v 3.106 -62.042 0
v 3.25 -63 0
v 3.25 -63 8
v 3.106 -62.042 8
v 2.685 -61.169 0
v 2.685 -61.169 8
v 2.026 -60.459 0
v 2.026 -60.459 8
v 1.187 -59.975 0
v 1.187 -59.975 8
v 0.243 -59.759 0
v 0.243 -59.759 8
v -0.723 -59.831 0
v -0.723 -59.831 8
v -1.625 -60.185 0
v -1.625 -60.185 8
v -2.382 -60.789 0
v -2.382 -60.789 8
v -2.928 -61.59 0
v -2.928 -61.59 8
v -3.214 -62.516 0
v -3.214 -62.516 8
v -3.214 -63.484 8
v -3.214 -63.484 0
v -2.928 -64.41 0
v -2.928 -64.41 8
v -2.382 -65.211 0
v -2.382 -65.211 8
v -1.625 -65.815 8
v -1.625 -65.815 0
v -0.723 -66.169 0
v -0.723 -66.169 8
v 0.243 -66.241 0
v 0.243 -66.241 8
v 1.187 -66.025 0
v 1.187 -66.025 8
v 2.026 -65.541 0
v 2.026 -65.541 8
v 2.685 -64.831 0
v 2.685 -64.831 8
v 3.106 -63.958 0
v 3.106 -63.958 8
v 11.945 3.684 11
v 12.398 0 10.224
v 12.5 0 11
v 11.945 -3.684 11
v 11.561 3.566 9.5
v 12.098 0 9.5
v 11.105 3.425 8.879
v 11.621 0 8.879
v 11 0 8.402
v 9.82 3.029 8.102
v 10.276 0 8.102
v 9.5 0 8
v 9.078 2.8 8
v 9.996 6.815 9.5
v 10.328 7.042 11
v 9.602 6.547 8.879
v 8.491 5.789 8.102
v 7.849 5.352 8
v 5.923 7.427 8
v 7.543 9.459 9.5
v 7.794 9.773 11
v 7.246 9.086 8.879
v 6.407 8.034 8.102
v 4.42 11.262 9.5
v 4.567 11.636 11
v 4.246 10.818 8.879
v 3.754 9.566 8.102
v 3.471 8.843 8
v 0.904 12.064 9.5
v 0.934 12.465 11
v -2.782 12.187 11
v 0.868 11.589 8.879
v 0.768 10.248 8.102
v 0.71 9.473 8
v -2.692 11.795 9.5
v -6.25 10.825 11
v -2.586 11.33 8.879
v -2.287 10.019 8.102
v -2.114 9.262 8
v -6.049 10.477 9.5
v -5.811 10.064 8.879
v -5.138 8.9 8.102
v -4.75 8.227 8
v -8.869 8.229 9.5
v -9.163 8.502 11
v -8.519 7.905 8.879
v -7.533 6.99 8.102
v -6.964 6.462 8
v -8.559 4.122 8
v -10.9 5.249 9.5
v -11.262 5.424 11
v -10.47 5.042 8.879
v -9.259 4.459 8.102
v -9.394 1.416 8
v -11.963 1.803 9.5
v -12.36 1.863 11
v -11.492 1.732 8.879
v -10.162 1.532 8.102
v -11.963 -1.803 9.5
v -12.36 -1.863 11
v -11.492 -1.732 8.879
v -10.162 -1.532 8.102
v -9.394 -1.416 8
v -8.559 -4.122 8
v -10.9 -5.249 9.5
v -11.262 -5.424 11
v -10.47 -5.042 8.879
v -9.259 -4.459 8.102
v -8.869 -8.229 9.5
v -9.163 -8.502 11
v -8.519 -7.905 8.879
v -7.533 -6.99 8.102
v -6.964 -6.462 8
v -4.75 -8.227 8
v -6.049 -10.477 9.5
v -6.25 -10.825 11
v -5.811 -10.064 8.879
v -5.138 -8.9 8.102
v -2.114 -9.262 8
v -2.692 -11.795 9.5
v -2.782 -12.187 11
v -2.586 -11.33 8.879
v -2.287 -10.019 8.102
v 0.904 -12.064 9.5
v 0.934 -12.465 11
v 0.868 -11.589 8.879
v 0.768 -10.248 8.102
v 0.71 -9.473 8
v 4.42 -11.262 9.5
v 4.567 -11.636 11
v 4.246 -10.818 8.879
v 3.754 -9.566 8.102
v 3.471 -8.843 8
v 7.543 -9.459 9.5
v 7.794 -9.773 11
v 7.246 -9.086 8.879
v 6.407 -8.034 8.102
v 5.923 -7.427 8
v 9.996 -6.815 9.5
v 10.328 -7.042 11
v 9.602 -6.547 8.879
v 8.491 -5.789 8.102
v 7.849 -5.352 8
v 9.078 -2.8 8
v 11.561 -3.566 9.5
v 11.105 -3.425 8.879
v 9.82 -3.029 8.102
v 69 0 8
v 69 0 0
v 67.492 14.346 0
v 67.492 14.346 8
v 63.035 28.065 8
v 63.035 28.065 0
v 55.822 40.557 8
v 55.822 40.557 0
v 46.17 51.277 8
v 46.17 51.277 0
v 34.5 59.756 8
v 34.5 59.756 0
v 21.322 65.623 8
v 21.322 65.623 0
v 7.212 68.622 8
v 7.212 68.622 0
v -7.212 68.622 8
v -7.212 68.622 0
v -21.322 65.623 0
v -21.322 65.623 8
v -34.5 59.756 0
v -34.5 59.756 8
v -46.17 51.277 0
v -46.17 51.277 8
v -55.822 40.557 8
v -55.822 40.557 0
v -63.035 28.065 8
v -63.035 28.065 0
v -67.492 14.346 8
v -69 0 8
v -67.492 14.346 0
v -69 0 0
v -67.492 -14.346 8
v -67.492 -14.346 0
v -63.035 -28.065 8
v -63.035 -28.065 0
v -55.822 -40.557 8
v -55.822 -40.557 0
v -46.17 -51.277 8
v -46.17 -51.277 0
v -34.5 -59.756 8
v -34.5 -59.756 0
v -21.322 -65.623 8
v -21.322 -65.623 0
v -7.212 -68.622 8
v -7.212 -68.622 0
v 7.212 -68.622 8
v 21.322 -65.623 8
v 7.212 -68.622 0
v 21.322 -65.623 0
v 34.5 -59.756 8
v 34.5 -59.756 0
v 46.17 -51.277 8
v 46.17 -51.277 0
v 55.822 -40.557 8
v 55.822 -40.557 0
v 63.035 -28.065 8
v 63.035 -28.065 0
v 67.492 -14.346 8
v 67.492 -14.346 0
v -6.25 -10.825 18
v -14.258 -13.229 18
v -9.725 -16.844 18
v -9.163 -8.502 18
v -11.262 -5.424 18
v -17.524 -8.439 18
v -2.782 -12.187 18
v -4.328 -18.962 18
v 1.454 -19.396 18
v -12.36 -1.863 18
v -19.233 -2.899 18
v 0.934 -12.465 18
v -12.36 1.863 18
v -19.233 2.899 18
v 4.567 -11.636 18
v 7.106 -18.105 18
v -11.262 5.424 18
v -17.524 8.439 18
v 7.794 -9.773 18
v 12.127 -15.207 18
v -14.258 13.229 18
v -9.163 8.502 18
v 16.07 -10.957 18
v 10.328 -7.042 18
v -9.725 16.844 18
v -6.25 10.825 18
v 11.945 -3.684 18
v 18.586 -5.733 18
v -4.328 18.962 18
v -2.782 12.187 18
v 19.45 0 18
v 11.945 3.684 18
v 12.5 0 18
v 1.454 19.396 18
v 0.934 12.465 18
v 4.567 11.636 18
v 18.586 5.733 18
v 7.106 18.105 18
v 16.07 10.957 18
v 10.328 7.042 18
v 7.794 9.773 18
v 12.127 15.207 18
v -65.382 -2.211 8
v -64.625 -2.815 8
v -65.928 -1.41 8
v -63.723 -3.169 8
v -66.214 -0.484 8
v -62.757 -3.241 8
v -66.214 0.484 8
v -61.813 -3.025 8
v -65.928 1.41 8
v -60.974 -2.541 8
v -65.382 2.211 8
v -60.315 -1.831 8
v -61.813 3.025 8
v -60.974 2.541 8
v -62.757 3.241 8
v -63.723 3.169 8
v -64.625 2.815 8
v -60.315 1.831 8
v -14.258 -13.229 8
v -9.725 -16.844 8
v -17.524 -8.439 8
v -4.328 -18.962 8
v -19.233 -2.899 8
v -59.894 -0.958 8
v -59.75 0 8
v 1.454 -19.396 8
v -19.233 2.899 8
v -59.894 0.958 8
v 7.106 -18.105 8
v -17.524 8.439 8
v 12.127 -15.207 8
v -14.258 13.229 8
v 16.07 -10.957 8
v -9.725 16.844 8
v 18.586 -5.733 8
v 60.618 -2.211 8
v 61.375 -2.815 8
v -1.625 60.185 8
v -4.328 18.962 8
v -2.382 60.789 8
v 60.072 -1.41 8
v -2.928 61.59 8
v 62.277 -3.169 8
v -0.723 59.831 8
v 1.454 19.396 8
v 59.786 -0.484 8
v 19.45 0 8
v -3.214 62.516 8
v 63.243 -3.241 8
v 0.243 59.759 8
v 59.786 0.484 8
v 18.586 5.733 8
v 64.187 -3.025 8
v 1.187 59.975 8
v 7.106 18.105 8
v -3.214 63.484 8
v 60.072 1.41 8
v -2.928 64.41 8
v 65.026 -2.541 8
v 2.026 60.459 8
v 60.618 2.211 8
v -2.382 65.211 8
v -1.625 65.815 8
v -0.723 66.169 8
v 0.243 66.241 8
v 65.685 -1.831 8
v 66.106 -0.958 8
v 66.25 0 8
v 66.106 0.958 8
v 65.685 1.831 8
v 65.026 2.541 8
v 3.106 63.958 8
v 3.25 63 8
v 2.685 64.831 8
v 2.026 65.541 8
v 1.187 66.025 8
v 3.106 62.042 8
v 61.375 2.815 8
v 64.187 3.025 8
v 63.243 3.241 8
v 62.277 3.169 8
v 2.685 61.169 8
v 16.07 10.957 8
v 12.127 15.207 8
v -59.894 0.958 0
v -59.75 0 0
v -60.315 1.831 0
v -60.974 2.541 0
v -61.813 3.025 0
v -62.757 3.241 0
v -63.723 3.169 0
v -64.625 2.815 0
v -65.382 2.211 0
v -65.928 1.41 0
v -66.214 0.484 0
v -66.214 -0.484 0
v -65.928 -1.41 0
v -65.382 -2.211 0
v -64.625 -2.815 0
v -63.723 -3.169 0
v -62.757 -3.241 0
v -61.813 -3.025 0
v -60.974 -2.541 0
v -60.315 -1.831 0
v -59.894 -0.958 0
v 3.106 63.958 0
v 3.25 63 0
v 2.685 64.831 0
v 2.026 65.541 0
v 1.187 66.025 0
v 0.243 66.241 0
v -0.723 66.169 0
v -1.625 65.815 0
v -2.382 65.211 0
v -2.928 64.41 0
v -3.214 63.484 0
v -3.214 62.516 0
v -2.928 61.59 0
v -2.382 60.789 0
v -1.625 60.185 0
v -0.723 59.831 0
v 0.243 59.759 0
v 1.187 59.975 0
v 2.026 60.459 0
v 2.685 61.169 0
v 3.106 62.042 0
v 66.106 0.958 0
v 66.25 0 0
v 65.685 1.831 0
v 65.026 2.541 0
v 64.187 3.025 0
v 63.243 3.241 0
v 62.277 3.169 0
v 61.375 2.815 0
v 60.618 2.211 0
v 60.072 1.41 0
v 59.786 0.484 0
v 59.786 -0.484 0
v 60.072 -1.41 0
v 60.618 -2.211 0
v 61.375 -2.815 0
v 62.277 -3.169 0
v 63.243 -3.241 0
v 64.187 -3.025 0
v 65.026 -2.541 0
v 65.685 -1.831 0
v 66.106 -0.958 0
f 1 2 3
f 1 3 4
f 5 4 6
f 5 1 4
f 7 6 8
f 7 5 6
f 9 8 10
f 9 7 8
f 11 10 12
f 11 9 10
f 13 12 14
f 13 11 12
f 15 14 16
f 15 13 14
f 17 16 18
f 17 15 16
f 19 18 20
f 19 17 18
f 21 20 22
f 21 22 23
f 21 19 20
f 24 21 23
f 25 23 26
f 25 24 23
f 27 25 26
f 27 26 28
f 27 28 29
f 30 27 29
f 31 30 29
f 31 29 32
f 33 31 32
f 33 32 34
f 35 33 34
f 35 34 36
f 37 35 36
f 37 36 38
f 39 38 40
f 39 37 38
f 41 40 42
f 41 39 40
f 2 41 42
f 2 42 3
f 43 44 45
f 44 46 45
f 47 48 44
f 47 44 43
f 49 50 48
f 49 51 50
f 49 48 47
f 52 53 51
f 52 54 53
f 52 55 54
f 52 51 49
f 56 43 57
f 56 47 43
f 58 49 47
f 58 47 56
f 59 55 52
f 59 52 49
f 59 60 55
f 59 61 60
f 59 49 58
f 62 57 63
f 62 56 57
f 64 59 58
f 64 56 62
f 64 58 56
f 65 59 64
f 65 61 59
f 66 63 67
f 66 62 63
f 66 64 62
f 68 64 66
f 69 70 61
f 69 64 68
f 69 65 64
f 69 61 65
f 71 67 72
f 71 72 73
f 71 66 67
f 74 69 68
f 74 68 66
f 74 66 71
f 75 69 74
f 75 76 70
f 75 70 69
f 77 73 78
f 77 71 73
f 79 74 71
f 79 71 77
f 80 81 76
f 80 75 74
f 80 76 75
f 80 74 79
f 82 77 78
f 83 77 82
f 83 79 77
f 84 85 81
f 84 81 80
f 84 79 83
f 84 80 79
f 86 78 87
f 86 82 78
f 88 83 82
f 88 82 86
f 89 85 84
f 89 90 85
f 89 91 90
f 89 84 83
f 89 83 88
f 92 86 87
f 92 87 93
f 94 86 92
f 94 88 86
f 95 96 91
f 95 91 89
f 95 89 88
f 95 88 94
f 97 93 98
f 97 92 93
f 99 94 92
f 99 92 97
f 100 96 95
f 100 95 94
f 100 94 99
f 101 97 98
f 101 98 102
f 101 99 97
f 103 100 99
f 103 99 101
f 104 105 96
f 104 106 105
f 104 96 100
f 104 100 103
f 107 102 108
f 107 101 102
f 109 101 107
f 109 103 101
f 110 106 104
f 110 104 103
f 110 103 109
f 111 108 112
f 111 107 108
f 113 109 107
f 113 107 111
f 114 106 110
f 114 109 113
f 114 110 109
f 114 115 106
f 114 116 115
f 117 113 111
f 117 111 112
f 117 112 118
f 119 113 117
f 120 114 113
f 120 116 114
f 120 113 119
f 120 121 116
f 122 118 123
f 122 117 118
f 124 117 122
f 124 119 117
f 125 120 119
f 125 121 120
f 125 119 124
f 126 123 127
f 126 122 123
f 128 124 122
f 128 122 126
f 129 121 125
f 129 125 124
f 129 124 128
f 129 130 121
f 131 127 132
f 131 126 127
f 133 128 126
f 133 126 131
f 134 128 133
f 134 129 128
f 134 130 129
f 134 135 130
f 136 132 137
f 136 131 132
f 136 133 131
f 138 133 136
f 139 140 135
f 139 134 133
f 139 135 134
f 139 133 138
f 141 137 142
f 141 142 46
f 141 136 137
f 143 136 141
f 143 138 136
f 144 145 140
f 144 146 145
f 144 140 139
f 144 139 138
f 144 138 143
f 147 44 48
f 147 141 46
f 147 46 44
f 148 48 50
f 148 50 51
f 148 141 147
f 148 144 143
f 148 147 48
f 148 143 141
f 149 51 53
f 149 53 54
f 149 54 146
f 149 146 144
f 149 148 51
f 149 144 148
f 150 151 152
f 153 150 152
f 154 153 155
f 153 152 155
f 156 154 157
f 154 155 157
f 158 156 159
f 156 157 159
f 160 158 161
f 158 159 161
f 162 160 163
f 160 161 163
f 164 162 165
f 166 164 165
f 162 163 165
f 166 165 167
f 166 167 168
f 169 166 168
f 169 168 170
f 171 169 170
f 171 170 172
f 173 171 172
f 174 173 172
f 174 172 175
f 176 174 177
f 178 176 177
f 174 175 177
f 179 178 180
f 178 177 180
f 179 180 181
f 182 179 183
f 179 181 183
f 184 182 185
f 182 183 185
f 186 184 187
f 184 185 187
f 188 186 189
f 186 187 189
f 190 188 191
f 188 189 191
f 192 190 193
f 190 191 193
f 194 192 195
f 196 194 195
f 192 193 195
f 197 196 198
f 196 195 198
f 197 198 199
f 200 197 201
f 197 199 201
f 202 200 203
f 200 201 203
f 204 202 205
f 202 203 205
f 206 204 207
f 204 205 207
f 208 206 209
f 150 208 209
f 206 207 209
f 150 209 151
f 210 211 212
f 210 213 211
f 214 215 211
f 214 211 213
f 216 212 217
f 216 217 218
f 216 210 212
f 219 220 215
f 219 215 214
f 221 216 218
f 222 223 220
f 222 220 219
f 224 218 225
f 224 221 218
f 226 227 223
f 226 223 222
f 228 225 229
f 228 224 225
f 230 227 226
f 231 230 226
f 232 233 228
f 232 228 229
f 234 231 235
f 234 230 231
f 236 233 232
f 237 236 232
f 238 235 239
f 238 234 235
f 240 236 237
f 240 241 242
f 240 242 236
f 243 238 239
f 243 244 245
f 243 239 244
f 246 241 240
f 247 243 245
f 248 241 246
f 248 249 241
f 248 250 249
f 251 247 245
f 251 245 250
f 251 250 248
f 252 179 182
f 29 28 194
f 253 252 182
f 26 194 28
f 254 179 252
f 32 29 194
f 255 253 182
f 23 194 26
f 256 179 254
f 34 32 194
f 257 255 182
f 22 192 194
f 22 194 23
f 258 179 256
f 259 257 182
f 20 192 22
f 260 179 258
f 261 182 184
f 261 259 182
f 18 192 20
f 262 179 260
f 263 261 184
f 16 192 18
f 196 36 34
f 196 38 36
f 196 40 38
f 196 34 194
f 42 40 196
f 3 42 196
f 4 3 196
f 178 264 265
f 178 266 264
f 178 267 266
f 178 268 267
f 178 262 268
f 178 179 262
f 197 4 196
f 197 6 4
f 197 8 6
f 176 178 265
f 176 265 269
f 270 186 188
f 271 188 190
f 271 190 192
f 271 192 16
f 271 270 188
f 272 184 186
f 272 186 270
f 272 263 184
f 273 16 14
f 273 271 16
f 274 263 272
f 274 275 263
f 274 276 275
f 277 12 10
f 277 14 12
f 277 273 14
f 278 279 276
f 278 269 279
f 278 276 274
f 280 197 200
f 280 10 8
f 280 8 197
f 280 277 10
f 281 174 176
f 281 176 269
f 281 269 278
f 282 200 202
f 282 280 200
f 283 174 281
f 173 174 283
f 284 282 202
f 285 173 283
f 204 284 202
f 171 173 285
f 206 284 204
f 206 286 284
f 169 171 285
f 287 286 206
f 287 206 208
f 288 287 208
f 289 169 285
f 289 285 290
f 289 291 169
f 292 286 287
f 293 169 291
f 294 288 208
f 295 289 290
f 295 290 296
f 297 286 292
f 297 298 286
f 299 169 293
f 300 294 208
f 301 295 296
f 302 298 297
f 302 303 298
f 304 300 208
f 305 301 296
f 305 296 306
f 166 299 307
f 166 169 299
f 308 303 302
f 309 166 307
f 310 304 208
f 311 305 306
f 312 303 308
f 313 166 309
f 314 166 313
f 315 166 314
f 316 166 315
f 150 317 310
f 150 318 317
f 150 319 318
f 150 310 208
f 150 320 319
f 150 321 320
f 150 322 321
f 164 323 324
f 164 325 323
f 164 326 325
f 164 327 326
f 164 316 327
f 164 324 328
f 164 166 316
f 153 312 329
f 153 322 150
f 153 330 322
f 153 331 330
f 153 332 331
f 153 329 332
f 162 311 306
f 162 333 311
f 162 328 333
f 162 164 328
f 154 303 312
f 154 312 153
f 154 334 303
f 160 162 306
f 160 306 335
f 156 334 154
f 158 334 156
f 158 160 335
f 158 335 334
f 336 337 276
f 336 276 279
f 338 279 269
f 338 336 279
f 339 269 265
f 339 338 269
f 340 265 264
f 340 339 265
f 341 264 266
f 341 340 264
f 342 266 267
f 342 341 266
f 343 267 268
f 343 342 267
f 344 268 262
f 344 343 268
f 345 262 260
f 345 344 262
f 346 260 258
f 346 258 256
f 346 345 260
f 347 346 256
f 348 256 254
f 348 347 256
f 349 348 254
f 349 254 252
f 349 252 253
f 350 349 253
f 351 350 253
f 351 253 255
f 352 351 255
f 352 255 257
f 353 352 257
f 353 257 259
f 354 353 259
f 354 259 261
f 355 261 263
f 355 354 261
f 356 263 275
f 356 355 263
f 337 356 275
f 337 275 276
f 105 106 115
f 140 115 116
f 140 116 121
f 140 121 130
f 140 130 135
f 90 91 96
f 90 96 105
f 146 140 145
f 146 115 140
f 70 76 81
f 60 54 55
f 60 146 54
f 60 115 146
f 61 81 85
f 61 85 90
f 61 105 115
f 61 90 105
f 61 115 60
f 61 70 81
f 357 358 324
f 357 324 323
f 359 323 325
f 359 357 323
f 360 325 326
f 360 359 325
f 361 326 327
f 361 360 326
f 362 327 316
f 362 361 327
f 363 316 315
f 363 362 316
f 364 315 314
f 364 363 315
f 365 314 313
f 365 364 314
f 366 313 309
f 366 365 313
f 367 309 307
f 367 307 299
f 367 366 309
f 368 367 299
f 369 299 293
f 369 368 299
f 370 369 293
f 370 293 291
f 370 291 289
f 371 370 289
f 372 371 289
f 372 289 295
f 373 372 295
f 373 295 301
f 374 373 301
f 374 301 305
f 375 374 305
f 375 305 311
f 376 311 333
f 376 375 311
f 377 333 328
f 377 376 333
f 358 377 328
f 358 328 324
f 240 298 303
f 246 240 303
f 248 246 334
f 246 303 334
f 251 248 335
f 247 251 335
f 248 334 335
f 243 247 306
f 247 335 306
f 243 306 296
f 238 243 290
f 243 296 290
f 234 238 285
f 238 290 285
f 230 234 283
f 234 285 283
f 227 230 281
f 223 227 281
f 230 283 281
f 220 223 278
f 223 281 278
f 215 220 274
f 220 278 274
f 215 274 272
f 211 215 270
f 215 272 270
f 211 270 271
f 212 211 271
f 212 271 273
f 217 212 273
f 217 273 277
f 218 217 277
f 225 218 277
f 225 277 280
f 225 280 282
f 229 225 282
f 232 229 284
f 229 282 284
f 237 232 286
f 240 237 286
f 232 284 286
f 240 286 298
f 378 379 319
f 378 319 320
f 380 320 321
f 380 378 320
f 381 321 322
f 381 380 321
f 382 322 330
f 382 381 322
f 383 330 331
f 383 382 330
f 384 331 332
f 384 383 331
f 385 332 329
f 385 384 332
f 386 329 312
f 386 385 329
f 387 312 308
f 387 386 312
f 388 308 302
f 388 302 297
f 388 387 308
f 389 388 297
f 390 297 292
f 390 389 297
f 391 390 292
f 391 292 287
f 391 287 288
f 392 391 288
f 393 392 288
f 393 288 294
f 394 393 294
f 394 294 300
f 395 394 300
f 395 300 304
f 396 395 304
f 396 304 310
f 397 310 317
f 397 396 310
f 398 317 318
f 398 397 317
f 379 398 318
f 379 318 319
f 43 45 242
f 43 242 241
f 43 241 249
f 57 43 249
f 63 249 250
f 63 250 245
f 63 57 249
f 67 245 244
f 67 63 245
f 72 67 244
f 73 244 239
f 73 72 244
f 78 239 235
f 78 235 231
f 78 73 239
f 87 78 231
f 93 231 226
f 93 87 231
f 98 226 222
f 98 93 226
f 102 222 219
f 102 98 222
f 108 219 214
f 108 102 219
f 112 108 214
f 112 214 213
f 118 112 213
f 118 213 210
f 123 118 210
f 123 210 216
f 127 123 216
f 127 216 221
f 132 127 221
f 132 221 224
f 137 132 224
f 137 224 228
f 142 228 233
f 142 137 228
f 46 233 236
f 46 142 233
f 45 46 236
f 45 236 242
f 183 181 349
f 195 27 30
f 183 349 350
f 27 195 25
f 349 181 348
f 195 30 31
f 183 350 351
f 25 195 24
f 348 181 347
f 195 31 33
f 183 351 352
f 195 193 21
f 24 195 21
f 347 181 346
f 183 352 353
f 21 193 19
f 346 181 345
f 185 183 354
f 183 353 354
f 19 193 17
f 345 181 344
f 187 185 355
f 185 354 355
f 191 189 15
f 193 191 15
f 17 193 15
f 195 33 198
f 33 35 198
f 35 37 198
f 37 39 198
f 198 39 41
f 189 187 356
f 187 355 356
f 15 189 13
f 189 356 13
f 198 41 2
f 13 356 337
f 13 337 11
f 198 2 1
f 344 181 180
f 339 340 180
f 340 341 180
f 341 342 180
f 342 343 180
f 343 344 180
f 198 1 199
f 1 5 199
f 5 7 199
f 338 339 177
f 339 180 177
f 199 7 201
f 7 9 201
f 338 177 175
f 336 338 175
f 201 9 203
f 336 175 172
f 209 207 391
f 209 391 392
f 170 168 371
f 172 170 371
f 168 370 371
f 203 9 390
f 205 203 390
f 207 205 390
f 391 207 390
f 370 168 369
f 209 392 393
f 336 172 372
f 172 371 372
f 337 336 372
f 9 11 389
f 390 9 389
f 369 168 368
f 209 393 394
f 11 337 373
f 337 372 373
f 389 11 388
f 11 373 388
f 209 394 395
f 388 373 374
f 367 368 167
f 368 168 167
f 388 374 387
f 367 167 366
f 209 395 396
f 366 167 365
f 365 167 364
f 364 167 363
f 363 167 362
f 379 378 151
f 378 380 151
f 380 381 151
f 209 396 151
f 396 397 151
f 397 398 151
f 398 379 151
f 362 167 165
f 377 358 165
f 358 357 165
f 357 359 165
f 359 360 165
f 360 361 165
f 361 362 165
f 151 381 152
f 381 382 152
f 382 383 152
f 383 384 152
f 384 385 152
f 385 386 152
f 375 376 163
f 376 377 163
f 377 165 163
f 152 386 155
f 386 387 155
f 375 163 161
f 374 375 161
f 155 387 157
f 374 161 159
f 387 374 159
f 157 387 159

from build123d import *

# Parameters (mm, degrees)
F0_R     = 69
F0_R_2   = 3.25
F1_DEPTH = 8
F2_R     = 19.45
F2_R_2   = 12.5
F3_DEPTH = 10
F4_R     = 3


with BuildPart() as f1:
    # F0 (on Top) → F1 (new body)
    with BuildSketch(Plane.XY):
        Circle(F0_R)
        with Locations((0, -63)):
            Circle(F0_R_2, mode=Mode.SUBTRACT)
        with Locations((-63, 0)):
            Circle(F0_R_2, mode=Mode.SUBTRACT)
        with Locations((63, 0)):
            Circle(F0_R_2, mode=Mode.SUBTRACT)
        with Locations((0, 63)):
            Circle(F0_R_2, mode=Mode.SUBTRACT)
    extrude(amount=F1_DEPTH)

    # F2 (on face) → F3 (join)
    with BuildSketch(Plane.XY.offset(8)):
        Circle(F2_R)
        Circle(F2_R_2, mode=Mode.SUBTRACT)
    extrude(amount=F3_DEPTH)

    # F4
    f4_edges = [f1.edges().sort_by_distance(p)[0] for p in [
        (-12.5, 0, 8),
    ]]
    fillet(f4_edges, radius=F4_R)


solid = f1.part
